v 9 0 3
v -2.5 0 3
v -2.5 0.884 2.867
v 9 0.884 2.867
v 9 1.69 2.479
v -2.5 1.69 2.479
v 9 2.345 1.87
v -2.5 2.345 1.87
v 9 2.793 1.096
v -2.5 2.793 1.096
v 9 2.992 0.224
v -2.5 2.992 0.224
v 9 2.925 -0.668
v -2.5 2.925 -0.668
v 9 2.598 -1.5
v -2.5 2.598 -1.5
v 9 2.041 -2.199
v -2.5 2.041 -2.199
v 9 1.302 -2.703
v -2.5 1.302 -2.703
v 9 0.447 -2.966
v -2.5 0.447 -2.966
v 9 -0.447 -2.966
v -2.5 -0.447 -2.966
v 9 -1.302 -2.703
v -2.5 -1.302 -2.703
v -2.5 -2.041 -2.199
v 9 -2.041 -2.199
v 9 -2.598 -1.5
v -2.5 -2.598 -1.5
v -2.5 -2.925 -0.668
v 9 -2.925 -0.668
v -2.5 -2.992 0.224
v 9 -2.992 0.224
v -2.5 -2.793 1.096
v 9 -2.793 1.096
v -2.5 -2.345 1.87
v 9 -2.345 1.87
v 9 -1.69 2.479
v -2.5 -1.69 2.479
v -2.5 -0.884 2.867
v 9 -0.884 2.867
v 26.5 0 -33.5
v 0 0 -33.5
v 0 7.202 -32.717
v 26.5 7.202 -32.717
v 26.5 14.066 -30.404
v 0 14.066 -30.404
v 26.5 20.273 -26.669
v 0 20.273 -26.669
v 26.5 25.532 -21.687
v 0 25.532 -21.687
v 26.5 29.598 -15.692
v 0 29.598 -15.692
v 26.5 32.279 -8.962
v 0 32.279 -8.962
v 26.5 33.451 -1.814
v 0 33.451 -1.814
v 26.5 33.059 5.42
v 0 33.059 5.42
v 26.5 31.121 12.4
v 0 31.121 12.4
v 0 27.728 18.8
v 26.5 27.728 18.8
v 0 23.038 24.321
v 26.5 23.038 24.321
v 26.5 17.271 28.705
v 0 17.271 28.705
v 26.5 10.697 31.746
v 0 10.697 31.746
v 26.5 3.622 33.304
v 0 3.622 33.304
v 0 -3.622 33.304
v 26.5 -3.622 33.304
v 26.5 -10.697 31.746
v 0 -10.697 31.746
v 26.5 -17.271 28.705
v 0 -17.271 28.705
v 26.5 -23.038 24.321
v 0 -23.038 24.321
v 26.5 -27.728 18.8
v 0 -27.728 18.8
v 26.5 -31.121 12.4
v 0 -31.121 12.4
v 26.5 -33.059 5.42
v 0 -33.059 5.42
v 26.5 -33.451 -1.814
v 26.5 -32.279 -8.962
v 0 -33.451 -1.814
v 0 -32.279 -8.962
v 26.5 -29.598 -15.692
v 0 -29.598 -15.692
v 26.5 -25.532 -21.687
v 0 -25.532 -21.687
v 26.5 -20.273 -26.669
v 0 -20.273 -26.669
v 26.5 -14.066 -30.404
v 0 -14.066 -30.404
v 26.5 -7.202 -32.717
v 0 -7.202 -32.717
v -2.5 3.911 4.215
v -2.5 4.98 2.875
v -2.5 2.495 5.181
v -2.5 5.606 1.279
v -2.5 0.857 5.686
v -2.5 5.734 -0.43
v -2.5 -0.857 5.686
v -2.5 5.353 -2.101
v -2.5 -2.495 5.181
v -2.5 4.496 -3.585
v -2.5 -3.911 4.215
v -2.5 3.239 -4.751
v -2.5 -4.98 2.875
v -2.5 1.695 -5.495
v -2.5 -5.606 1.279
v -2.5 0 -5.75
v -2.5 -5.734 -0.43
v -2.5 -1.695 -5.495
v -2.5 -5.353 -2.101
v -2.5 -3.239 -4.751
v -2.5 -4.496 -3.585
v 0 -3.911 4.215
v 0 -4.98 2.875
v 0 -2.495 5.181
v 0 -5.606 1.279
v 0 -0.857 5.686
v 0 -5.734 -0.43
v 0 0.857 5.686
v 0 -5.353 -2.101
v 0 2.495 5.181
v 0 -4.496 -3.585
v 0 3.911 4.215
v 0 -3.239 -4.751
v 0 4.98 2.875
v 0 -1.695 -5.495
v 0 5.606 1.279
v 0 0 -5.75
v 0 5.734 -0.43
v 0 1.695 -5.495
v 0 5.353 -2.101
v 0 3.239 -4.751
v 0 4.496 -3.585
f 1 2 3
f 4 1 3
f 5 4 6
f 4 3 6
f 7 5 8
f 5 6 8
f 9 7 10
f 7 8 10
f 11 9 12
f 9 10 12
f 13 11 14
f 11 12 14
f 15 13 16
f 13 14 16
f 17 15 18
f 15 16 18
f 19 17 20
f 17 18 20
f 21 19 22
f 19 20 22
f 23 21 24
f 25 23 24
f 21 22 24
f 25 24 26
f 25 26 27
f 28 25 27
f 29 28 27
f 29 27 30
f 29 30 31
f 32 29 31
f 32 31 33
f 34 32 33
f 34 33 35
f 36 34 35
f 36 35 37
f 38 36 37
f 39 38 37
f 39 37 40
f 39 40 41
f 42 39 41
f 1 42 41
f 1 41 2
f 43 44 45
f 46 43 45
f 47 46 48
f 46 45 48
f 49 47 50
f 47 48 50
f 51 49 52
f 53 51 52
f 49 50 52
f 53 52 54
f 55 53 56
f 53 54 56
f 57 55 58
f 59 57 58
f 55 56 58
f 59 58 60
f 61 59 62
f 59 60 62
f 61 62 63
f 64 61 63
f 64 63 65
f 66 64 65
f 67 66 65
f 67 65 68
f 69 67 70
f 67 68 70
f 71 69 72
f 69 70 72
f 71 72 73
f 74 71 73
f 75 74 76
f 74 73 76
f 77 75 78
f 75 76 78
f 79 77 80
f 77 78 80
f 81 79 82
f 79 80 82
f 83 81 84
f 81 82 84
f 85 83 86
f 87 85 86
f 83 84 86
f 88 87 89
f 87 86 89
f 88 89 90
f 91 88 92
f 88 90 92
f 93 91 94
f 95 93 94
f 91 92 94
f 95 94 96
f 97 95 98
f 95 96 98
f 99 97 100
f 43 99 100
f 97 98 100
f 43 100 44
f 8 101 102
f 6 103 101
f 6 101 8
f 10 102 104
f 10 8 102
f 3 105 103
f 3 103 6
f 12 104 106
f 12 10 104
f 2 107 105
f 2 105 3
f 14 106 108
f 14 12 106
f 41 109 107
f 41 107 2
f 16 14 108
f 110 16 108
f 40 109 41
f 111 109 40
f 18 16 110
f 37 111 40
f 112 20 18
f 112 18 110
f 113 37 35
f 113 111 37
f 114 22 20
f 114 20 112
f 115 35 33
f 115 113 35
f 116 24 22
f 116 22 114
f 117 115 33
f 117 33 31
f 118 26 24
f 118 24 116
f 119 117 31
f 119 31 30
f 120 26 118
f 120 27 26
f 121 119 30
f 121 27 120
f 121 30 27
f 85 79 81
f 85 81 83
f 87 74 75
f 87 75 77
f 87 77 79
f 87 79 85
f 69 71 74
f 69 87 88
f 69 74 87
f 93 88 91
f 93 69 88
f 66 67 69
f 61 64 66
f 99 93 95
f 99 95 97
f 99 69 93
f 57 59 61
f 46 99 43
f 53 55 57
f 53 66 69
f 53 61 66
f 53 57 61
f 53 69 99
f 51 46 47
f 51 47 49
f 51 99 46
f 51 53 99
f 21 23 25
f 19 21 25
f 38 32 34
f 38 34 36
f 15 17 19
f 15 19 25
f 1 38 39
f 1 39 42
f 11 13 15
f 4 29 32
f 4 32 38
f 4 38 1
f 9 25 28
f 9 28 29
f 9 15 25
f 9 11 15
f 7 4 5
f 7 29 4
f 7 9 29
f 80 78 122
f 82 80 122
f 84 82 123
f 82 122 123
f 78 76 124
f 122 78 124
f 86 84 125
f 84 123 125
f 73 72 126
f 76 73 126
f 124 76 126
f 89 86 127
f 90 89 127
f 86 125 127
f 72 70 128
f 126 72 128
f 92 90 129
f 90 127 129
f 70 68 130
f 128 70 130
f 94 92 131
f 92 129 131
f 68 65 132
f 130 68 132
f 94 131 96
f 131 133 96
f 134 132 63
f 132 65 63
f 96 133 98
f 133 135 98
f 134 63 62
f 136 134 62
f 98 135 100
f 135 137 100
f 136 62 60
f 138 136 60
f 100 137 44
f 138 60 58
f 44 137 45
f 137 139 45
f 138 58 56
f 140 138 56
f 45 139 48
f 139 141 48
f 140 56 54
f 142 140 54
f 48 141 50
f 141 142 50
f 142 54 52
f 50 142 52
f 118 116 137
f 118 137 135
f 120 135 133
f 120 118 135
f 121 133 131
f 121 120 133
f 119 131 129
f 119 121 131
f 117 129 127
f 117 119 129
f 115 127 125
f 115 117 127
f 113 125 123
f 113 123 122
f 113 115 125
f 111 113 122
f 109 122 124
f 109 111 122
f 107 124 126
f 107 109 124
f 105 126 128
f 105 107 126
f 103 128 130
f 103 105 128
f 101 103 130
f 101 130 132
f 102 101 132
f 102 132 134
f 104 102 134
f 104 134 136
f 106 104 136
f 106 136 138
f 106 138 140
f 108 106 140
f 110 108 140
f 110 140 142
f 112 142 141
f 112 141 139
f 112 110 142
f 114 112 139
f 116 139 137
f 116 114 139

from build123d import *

# Parameters (mm, degrees)
SKETCH_4_R          = 33.5
EXTRUDE_1_DEPTH     = 26.5
SKETCH_5_R          = 3
CUT_EXTRUDE_1_DEPTH = 9
EXTRUDE_START       = 2.5
SKETCH_6_R          = 5.75
SKETCH_6_R_2        = 3
EXTRUDE_3_DEPTH     = 2.5


with BuildPart() as part:
    # 草图4 → 凸台-拉伸1 (new body)
    with BuildSketch(Plane(origin=(0, 0, 0), x_dir=(0, 0, -1), z_dir=(1, 0, 0))):
        Circle(SKETCH_4_R)
    extrude(amount=EXTRUDE_1_DEPTH)

    # 草图5 → 切除-拉伸1 (cut)
    with BuildSketch(Plane.ZY):
        Circle(SKETCH_5_R)
    extrude(amount=-CUT_EXTRUDE_1_DEPTH, mode=Mode.SUBTRACT)

    # 草图6 → 凸台-拉伸3 (add)
    with BuildSketch(Plane.ZY.offset(EXTRUDE_START)):
        with Locations(Location((0, 0, 0), (0, 0, 180))):
            Circle(SKETCH_6_R)
        Circle(SKETCH_6_R_2, mode=Mode.SUBTRACT)
    extrude(amount=-EXTRUDE_3_DEPTH)


solid = part.part
